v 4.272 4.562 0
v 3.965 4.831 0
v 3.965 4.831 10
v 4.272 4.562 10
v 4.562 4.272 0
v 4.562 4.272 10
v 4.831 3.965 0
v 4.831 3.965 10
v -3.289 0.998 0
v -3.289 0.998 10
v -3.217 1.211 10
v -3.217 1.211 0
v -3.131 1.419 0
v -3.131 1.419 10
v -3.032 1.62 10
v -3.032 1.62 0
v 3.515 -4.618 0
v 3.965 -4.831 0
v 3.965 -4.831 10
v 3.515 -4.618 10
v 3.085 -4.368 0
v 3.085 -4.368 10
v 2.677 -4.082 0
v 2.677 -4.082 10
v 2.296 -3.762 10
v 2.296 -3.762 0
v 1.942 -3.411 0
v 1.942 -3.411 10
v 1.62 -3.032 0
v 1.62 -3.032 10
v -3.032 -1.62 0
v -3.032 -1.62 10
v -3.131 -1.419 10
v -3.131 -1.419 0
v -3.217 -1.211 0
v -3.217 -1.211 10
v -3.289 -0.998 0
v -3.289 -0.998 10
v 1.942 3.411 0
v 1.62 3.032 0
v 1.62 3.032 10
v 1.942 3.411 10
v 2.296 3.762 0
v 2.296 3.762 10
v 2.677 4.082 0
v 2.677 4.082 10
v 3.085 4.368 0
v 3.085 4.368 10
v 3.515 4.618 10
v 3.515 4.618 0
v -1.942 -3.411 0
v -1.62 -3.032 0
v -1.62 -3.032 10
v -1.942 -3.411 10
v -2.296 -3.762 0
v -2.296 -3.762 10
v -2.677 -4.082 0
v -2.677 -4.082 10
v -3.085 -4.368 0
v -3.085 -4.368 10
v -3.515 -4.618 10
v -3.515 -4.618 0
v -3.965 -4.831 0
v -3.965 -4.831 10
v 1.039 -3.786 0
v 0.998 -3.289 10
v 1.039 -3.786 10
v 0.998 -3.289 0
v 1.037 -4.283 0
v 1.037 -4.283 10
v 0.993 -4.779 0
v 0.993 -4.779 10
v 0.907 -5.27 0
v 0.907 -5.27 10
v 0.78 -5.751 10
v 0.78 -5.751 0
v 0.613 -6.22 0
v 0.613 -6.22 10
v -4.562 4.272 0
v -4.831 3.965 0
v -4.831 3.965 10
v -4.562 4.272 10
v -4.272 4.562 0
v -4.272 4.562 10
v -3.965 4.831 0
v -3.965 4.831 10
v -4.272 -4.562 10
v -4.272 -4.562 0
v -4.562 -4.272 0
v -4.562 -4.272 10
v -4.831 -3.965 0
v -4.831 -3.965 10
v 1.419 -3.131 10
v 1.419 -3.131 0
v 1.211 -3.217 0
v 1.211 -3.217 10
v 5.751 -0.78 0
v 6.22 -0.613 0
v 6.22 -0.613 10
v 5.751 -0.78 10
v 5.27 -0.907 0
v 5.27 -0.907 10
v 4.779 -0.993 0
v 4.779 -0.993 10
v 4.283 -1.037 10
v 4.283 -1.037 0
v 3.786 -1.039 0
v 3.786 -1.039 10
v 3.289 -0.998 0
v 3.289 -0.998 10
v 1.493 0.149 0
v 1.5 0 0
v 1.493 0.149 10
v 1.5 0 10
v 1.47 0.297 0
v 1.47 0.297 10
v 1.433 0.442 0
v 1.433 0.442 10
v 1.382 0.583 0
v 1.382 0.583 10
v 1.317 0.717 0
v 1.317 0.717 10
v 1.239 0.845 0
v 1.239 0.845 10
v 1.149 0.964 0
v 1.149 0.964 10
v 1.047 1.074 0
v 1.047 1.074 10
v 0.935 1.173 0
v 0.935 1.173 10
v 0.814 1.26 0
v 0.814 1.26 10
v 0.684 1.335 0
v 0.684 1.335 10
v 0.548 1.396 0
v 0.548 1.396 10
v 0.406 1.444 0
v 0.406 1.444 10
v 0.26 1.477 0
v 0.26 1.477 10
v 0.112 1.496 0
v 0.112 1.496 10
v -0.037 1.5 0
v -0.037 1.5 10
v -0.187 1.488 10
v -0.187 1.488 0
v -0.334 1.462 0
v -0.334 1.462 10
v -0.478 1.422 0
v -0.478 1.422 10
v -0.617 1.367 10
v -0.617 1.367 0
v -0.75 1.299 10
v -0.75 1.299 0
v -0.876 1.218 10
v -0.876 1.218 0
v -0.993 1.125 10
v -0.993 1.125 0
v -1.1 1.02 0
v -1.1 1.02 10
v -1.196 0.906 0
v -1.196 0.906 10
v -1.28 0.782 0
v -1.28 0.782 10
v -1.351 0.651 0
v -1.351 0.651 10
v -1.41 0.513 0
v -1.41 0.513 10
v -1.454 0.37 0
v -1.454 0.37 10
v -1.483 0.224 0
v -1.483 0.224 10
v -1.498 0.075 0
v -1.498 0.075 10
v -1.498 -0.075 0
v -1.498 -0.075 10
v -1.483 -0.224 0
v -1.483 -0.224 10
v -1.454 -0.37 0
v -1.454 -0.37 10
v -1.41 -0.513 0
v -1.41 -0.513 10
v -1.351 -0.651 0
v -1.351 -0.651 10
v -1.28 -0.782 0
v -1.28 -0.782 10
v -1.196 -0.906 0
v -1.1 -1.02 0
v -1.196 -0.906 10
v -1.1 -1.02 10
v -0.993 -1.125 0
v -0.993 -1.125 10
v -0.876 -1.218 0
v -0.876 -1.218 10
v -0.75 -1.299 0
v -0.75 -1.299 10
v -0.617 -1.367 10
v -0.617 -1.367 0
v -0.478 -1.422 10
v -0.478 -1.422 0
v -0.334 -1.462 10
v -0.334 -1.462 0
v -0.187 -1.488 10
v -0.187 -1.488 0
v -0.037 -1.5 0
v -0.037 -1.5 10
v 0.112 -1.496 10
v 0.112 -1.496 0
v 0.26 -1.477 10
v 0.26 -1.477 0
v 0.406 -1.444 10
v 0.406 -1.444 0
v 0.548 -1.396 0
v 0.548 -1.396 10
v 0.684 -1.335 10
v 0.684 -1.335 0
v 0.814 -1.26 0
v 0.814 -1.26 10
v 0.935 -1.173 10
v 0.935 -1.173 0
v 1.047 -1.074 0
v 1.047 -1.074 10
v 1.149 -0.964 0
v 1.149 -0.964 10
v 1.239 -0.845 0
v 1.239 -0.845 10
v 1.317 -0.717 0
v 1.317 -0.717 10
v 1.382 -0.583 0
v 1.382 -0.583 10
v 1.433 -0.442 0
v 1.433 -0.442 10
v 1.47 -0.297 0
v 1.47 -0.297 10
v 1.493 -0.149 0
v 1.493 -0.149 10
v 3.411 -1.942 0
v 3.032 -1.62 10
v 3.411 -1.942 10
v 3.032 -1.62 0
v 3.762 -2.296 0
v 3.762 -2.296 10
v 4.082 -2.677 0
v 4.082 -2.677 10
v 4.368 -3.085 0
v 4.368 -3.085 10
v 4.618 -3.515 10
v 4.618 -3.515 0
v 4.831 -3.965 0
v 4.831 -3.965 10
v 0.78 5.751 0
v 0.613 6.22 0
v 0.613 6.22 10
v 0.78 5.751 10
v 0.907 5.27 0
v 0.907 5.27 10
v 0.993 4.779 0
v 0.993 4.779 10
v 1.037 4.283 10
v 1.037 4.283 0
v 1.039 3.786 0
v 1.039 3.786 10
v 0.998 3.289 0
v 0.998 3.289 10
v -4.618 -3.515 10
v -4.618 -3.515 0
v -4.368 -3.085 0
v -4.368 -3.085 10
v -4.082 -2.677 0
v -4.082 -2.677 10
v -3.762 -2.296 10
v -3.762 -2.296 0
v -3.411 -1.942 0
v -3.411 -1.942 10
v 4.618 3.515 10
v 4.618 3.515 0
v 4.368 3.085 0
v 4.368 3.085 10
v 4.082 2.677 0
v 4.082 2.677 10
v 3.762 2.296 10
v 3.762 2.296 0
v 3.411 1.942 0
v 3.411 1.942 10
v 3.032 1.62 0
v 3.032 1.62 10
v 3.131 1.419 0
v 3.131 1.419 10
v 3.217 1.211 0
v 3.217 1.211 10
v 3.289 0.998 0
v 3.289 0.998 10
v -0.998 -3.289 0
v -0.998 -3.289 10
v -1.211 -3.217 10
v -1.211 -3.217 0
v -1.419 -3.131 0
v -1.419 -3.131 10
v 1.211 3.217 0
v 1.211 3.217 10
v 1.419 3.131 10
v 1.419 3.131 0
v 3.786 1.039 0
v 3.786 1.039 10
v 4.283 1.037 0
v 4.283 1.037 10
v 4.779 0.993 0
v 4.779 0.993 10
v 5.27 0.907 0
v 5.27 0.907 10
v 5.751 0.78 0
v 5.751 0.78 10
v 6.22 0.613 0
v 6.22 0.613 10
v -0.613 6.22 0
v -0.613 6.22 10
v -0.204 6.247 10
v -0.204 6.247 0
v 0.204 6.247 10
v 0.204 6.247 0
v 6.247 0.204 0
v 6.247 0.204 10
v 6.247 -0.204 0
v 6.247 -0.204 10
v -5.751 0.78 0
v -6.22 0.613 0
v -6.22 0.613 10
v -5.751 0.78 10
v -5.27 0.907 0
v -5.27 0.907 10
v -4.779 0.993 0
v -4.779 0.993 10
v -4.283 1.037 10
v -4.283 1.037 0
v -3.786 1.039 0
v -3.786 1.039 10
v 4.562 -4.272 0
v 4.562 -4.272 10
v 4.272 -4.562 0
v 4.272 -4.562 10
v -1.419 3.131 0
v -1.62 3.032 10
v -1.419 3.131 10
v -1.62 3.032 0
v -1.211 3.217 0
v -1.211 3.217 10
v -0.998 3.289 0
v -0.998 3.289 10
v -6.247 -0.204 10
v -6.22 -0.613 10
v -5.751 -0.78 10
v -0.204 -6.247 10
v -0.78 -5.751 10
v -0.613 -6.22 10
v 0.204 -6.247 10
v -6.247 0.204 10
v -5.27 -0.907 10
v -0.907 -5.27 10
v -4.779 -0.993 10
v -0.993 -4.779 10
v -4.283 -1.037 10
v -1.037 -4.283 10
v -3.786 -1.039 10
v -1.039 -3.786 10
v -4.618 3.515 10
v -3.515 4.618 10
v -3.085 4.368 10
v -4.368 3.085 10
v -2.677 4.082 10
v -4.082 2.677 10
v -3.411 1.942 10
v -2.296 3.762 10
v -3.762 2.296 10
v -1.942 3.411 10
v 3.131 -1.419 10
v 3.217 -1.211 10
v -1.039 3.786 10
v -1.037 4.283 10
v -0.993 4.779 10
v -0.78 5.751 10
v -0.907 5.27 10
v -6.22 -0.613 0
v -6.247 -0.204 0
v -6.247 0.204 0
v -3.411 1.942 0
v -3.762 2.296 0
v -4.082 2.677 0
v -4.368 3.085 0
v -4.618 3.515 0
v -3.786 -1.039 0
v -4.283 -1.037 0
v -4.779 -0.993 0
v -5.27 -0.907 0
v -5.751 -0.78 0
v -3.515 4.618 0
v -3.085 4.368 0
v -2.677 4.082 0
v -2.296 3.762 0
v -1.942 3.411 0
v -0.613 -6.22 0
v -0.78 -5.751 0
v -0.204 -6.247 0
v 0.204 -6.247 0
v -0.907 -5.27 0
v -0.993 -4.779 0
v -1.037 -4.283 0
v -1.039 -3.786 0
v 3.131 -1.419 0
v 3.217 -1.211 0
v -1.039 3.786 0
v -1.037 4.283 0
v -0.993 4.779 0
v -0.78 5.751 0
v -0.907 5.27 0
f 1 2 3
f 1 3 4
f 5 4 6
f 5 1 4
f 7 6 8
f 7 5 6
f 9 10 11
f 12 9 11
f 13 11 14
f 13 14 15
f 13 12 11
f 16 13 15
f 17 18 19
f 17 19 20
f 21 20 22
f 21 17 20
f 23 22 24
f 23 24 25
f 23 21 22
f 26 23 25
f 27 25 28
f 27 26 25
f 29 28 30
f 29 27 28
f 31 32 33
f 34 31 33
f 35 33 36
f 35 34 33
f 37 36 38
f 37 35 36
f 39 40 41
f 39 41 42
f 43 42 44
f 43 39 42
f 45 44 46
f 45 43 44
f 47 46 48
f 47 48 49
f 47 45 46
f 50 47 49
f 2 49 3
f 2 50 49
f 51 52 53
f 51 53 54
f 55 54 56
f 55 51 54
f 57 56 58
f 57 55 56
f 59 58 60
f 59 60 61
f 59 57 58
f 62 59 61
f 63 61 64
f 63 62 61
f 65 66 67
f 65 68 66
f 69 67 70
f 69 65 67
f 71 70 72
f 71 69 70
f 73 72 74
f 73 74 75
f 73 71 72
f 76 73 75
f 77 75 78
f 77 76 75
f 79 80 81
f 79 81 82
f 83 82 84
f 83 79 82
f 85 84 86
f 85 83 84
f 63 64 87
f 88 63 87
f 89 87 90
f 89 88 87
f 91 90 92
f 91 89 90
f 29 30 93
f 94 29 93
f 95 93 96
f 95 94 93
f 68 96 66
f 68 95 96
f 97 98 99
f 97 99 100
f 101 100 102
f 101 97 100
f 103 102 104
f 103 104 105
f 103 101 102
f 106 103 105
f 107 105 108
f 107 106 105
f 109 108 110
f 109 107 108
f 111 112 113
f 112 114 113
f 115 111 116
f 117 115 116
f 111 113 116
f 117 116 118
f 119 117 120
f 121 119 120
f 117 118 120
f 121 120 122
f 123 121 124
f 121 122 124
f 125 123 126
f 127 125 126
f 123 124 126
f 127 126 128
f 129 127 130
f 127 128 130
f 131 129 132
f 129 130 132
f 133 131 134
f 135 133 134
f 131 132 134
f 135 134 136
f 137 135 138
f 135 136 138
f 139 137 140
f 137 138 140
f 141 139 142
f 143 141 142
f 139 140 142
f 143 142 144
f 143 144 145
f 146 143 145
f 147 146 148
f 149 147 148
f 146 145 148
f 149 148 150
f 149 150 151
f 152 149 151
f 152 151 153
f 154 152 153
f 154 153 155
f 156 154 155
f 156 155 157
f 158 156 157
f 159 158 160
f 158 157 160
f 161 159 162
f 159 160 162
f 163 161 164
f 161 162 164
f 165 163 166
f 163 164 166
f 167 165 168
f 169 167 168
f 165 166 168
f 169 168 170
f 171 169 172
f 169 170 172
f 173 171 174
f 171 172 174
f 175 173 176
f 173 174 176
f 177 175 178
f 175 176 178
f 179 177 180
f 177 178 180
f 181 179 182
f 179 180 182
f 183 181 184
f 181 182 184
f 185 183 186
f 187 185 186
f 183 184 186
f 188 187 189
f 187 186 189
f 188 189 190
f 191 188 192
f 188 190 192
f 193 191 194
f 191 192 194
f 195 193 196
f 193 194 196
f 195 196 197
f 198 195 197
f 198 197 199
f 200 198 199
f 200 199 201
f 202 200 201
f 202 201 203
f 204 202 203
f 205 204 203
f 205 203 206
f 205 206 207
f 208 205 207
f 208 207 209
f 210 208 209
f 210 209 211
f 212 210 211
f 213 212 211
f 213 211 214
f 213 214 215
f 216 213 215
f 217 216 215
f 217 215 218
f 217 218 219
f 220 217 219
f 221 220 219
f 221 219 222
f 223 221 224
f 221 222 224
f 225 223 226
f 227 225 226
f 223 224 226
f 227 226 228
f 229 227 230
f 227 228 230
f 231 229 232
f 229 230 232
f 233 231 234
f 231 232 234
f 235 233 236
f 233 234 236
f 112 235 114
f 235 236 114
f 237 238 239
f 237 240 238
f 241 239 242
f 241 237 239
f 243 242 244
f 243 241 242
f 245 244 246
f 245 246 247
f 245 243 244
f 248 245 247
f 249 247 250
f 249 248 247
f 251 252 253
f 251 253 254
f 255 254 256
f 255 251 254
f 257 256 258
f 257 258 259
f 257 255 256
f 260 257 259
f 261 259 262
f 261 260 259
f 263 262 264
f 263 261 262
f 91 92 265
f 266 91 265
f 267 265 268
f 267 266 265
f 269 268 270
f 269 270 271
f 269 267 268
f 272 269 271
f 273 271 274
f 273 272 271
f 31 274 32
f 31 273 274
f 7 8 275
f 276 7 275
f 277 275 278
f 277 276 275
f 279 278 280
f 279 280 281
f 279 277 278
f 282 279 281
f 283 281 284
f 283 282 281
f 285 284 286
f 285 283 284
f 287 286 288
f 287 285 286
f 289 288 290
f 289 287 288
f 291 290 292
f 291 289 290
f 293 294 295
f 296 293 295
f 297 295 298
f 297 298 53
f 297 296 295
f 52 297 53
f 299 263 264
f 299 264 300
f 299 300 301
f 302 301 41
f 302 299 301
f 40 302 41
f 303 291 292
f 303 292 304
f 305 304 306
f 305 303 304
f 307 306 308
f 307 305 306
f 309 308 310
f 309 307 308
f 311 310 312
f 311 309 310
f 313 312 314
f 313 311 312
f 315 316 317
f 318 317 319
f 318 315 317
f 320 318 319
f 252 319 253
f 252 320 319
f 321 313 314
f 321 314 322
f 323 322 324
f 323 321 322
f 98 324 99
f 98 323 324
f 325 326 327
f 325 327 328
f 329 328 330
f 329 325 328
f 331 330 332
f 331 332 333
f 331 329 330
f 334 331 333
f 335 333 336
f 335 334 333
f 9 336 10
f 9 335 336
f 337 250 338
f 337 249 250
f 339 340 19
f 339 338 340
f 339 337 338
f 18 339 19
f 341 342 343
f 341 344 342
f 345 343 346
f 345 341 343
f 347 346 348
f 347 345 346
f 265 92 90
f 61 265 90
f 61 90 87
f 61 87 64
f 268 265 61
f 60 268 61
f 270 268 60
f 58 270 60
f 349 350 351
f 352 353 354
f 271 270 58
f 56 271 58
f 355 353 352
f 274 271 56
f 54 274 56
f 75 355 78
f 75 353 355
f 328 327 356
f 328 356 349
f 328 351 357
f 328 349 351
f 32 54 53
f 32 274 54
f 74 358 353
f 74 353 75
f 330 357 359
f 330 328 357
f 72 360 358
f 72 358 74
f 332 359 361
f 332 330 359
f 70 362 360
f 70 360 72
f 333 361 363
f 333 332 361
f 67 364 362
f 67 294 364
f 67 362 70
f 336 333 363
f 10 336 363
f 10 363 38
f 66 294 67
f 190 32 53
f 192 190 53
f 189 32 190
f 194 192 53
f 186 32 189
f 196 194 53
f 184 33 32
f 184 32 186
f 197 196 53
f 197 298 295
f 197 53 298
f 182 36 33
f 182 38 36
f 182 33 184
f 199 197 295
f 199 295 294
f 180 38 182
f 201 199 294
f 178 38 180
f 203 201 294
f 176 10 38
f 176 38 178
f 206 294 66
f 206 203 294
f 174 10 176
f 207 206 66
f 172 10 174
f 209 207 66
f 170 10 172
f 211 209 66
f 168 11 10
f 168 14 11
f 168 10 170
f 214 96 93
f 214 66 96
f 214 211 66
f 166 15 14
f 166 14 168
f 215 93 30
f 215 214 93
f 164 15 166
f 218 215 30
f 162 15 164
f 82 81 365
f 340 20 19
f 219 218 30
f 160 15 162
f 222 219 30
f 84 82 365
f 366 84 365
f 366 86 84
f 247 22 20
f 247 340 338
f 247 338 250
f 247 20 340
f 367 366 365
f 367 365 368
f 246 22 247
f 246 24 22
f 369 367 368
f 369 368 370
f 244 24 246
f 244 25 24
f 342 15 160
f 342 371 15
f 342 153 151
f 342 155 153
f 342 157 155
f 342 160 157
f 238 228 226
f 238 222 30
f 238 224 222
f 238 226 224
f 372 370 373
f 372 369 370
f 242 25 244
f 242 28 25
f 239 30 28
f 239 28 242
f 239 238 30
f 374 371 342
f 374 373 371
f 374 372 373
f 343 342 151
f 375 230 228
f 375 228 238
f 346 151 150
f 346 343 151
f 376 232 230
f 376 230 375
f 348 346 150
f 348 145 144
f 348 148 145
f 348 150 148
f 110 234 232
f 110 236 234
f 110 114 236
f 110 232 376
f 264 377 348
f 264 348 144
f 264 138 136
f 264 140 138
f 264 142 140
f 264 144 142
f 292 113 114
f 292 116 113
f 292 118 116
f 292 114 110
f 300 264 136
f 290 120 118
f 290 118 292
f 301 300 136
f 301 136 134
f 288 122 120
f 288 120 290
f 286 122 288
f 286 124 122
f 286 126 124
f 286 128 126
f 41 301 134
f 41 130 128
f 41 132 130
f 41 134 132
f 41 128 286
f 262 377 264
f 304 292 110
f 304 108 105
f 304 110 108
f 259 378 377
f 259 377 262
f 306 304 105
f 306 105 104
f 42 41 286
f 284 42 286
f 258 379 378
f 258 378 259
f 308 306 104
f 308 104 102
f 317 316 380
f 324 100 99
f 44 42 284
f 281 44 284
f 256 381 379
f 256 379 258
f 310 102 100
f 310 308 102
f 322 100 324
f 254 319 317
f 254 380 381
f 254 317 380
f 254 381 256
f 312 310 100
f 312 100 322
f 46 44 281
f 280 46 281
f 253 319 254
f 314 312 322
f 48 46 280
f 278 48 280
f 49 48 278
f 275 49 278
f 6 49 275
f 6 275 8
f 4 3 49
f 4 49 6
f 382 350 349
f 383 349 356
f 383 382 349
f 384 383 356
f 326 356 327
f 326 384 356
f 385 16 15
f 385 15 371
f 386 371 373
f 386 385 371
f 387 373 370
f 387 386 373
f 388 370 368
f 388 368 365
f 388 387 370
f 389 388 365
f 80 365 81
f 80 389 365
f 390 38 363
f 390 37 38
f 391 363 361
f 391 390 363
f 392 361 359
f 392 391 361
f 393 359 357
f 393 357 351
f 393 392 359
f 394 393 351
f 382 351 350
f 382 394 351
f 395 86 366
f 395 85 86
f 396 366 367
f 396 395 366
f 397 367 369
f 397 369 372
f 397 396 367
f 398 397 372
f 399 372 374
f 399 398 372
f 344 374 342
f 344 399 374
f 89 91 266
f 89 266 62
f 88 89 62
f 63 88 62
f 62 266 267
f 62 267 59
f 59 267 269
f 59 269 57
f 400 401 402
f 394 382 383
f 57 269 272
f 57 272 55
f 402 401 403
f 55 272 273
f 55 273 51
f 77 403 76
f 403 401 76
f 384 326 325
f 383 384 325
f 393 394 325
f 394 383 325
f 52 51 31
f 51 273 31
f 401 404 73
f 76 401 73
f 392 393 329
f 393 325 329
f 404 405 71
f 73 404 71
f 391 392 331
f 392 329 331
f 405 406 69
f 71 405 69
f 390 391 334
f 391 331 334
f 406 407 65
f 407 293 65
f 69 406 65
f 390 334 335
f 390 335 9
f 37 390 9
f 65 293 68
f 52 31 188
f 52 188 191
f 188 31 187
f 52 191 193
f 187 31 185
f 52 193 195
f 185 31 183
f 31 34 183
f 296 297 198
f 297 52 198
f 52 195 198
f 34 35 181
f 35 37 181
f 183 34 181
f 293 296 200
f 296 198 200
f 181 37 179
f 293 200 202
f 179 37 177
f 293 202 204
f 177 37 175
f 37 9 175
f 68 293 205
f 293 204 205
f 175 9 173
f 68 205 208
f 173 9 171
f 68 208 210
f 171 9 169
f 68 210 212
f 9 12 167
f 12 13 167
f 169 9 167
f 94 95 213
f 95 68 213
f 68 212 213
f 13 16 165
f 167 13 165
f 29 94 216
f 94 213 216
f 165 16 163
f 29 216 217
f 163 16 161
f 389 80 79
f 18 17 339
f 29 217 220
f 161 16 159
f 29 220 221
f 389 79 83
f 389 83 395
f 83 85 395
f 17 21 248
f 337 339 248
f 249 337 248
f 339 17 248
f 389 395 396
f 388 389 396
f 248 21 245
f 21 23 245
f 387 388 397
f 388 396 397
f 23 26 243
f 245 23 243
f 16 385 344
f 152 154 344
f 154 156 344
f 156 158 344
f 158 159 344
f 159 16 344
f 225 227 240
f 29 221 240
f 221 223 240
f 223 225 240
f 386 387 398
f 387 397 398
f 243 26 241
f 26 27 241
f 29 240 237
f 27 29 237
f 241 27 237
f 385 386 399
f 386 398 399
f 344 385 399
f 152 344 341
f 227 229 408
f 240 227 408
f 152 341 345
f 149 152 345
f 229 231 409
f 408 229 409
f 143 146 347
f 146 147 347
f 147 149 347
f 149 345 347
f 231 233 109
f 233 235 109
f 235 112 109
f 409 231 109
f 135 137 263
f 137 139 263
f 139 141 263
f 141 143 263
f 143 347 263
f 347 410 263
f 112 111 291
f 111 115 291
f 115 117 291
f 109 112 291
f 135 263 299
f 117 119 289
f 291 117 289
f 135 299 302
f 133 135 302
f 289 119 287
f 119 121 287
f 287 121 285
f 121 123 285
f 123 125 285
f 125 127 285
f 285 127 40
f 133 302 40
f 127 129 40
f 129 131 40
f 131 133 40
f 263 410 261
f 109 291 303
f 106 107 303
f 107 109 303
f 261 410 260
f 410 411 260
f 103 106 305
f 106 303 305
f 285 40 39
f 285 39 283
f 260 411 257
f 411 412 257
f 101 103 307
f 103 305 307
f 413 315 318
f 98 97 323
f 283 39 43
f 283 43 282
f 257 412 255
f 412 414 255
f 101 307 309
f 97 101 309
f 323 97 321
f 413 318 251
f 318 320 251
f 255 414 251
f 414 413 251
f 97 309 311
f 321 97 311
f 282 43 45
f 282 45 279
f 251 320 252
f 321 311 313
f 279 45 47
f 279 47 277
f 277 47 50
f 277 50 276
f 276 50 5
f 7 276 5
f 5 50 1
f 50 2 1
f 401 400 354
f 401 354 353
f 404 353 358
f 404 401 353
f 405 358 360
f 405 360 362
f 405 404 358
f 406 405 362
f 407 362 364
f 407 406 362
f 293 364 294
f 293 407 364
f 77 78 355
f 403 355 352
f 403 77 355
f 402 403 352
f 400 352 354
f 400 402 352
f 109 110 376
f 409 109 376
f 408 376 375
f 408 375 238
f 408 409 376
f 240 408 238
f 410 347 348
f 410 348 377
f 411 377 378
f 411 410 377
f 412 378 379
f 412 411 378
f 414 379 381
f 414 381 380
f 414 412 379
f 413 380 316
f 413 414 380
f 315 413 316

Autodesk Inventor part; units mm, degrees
sketch "Sketch1" plane through (0, 0, 0) normal (0, 0, 1) x (1, 0, 0)
  circle A0 centre (0, 0) radius 6.25
  dimension "d0" = 12.5
extrude "Extrusion1" add sketch "Sketch1" along normal blind 10
ref_plane "Work Plane2" through (0, 0, 5) normal (0, 0, 1) x (1, 0, 0)
sketch "Sketch2" plane through (0, 0, 0) normal (0, 0, -1) x (-1, 0, 0)
  circle A0 centre (0, 0) radius 6.25 projected
  circle A1 centre (0, 0) radius 5
  dimension "d3" = 10
surface extrude "Pitch Diameter" sketch "Sketch2" against normal through all shown no curves A1
ref_plane "Work Plane8" through (0, 0, 0) normal (0.9238795, 0.3826834, 0) x (0, 0, 1)
ref_plane "Work Plane9" through (0, 0, 0) normal (1, 0, 0) x (0, 1, 0)
spur gear teeth "Spur Gear" teeth 8 pitch diameter 10 tip diameter 12.5 root diameter 6.875 face width 10 start plane through (0, 0, 0) normal (0, 0, -1) x (-1, 0, 0)
sketch "Sketch3" plane through (0, 0, 10) normal (0, 0, 1) x (1, 0, 0)
  arc A0 (-3.965, 4.8313) -> (-4.8313, 3.965) centre (0, 0) ccw projected
  circle A1 centre (0, 0) radius 1.5
  dimension "d49" = 3
extrude "Extrusion2" cut sketch "Sketch3" against normal blind 30
equation "\"d0\" = da_da"
equation "\"d1\" = da_b"
equation "\"d3\" = da_dw"
equation "\"d16\" = da_aw"
equation "\"d43\" = da_aw"
equation "\"d46\" = da_aw"
equation "\"da_da\" = 12.5"
equation "\"da_b\" = 10"
equation "\"da_dw\" = 10"
equation "\"da_aw\" = 42.5"
properties part number "Spur Gear1" material "Steel"
